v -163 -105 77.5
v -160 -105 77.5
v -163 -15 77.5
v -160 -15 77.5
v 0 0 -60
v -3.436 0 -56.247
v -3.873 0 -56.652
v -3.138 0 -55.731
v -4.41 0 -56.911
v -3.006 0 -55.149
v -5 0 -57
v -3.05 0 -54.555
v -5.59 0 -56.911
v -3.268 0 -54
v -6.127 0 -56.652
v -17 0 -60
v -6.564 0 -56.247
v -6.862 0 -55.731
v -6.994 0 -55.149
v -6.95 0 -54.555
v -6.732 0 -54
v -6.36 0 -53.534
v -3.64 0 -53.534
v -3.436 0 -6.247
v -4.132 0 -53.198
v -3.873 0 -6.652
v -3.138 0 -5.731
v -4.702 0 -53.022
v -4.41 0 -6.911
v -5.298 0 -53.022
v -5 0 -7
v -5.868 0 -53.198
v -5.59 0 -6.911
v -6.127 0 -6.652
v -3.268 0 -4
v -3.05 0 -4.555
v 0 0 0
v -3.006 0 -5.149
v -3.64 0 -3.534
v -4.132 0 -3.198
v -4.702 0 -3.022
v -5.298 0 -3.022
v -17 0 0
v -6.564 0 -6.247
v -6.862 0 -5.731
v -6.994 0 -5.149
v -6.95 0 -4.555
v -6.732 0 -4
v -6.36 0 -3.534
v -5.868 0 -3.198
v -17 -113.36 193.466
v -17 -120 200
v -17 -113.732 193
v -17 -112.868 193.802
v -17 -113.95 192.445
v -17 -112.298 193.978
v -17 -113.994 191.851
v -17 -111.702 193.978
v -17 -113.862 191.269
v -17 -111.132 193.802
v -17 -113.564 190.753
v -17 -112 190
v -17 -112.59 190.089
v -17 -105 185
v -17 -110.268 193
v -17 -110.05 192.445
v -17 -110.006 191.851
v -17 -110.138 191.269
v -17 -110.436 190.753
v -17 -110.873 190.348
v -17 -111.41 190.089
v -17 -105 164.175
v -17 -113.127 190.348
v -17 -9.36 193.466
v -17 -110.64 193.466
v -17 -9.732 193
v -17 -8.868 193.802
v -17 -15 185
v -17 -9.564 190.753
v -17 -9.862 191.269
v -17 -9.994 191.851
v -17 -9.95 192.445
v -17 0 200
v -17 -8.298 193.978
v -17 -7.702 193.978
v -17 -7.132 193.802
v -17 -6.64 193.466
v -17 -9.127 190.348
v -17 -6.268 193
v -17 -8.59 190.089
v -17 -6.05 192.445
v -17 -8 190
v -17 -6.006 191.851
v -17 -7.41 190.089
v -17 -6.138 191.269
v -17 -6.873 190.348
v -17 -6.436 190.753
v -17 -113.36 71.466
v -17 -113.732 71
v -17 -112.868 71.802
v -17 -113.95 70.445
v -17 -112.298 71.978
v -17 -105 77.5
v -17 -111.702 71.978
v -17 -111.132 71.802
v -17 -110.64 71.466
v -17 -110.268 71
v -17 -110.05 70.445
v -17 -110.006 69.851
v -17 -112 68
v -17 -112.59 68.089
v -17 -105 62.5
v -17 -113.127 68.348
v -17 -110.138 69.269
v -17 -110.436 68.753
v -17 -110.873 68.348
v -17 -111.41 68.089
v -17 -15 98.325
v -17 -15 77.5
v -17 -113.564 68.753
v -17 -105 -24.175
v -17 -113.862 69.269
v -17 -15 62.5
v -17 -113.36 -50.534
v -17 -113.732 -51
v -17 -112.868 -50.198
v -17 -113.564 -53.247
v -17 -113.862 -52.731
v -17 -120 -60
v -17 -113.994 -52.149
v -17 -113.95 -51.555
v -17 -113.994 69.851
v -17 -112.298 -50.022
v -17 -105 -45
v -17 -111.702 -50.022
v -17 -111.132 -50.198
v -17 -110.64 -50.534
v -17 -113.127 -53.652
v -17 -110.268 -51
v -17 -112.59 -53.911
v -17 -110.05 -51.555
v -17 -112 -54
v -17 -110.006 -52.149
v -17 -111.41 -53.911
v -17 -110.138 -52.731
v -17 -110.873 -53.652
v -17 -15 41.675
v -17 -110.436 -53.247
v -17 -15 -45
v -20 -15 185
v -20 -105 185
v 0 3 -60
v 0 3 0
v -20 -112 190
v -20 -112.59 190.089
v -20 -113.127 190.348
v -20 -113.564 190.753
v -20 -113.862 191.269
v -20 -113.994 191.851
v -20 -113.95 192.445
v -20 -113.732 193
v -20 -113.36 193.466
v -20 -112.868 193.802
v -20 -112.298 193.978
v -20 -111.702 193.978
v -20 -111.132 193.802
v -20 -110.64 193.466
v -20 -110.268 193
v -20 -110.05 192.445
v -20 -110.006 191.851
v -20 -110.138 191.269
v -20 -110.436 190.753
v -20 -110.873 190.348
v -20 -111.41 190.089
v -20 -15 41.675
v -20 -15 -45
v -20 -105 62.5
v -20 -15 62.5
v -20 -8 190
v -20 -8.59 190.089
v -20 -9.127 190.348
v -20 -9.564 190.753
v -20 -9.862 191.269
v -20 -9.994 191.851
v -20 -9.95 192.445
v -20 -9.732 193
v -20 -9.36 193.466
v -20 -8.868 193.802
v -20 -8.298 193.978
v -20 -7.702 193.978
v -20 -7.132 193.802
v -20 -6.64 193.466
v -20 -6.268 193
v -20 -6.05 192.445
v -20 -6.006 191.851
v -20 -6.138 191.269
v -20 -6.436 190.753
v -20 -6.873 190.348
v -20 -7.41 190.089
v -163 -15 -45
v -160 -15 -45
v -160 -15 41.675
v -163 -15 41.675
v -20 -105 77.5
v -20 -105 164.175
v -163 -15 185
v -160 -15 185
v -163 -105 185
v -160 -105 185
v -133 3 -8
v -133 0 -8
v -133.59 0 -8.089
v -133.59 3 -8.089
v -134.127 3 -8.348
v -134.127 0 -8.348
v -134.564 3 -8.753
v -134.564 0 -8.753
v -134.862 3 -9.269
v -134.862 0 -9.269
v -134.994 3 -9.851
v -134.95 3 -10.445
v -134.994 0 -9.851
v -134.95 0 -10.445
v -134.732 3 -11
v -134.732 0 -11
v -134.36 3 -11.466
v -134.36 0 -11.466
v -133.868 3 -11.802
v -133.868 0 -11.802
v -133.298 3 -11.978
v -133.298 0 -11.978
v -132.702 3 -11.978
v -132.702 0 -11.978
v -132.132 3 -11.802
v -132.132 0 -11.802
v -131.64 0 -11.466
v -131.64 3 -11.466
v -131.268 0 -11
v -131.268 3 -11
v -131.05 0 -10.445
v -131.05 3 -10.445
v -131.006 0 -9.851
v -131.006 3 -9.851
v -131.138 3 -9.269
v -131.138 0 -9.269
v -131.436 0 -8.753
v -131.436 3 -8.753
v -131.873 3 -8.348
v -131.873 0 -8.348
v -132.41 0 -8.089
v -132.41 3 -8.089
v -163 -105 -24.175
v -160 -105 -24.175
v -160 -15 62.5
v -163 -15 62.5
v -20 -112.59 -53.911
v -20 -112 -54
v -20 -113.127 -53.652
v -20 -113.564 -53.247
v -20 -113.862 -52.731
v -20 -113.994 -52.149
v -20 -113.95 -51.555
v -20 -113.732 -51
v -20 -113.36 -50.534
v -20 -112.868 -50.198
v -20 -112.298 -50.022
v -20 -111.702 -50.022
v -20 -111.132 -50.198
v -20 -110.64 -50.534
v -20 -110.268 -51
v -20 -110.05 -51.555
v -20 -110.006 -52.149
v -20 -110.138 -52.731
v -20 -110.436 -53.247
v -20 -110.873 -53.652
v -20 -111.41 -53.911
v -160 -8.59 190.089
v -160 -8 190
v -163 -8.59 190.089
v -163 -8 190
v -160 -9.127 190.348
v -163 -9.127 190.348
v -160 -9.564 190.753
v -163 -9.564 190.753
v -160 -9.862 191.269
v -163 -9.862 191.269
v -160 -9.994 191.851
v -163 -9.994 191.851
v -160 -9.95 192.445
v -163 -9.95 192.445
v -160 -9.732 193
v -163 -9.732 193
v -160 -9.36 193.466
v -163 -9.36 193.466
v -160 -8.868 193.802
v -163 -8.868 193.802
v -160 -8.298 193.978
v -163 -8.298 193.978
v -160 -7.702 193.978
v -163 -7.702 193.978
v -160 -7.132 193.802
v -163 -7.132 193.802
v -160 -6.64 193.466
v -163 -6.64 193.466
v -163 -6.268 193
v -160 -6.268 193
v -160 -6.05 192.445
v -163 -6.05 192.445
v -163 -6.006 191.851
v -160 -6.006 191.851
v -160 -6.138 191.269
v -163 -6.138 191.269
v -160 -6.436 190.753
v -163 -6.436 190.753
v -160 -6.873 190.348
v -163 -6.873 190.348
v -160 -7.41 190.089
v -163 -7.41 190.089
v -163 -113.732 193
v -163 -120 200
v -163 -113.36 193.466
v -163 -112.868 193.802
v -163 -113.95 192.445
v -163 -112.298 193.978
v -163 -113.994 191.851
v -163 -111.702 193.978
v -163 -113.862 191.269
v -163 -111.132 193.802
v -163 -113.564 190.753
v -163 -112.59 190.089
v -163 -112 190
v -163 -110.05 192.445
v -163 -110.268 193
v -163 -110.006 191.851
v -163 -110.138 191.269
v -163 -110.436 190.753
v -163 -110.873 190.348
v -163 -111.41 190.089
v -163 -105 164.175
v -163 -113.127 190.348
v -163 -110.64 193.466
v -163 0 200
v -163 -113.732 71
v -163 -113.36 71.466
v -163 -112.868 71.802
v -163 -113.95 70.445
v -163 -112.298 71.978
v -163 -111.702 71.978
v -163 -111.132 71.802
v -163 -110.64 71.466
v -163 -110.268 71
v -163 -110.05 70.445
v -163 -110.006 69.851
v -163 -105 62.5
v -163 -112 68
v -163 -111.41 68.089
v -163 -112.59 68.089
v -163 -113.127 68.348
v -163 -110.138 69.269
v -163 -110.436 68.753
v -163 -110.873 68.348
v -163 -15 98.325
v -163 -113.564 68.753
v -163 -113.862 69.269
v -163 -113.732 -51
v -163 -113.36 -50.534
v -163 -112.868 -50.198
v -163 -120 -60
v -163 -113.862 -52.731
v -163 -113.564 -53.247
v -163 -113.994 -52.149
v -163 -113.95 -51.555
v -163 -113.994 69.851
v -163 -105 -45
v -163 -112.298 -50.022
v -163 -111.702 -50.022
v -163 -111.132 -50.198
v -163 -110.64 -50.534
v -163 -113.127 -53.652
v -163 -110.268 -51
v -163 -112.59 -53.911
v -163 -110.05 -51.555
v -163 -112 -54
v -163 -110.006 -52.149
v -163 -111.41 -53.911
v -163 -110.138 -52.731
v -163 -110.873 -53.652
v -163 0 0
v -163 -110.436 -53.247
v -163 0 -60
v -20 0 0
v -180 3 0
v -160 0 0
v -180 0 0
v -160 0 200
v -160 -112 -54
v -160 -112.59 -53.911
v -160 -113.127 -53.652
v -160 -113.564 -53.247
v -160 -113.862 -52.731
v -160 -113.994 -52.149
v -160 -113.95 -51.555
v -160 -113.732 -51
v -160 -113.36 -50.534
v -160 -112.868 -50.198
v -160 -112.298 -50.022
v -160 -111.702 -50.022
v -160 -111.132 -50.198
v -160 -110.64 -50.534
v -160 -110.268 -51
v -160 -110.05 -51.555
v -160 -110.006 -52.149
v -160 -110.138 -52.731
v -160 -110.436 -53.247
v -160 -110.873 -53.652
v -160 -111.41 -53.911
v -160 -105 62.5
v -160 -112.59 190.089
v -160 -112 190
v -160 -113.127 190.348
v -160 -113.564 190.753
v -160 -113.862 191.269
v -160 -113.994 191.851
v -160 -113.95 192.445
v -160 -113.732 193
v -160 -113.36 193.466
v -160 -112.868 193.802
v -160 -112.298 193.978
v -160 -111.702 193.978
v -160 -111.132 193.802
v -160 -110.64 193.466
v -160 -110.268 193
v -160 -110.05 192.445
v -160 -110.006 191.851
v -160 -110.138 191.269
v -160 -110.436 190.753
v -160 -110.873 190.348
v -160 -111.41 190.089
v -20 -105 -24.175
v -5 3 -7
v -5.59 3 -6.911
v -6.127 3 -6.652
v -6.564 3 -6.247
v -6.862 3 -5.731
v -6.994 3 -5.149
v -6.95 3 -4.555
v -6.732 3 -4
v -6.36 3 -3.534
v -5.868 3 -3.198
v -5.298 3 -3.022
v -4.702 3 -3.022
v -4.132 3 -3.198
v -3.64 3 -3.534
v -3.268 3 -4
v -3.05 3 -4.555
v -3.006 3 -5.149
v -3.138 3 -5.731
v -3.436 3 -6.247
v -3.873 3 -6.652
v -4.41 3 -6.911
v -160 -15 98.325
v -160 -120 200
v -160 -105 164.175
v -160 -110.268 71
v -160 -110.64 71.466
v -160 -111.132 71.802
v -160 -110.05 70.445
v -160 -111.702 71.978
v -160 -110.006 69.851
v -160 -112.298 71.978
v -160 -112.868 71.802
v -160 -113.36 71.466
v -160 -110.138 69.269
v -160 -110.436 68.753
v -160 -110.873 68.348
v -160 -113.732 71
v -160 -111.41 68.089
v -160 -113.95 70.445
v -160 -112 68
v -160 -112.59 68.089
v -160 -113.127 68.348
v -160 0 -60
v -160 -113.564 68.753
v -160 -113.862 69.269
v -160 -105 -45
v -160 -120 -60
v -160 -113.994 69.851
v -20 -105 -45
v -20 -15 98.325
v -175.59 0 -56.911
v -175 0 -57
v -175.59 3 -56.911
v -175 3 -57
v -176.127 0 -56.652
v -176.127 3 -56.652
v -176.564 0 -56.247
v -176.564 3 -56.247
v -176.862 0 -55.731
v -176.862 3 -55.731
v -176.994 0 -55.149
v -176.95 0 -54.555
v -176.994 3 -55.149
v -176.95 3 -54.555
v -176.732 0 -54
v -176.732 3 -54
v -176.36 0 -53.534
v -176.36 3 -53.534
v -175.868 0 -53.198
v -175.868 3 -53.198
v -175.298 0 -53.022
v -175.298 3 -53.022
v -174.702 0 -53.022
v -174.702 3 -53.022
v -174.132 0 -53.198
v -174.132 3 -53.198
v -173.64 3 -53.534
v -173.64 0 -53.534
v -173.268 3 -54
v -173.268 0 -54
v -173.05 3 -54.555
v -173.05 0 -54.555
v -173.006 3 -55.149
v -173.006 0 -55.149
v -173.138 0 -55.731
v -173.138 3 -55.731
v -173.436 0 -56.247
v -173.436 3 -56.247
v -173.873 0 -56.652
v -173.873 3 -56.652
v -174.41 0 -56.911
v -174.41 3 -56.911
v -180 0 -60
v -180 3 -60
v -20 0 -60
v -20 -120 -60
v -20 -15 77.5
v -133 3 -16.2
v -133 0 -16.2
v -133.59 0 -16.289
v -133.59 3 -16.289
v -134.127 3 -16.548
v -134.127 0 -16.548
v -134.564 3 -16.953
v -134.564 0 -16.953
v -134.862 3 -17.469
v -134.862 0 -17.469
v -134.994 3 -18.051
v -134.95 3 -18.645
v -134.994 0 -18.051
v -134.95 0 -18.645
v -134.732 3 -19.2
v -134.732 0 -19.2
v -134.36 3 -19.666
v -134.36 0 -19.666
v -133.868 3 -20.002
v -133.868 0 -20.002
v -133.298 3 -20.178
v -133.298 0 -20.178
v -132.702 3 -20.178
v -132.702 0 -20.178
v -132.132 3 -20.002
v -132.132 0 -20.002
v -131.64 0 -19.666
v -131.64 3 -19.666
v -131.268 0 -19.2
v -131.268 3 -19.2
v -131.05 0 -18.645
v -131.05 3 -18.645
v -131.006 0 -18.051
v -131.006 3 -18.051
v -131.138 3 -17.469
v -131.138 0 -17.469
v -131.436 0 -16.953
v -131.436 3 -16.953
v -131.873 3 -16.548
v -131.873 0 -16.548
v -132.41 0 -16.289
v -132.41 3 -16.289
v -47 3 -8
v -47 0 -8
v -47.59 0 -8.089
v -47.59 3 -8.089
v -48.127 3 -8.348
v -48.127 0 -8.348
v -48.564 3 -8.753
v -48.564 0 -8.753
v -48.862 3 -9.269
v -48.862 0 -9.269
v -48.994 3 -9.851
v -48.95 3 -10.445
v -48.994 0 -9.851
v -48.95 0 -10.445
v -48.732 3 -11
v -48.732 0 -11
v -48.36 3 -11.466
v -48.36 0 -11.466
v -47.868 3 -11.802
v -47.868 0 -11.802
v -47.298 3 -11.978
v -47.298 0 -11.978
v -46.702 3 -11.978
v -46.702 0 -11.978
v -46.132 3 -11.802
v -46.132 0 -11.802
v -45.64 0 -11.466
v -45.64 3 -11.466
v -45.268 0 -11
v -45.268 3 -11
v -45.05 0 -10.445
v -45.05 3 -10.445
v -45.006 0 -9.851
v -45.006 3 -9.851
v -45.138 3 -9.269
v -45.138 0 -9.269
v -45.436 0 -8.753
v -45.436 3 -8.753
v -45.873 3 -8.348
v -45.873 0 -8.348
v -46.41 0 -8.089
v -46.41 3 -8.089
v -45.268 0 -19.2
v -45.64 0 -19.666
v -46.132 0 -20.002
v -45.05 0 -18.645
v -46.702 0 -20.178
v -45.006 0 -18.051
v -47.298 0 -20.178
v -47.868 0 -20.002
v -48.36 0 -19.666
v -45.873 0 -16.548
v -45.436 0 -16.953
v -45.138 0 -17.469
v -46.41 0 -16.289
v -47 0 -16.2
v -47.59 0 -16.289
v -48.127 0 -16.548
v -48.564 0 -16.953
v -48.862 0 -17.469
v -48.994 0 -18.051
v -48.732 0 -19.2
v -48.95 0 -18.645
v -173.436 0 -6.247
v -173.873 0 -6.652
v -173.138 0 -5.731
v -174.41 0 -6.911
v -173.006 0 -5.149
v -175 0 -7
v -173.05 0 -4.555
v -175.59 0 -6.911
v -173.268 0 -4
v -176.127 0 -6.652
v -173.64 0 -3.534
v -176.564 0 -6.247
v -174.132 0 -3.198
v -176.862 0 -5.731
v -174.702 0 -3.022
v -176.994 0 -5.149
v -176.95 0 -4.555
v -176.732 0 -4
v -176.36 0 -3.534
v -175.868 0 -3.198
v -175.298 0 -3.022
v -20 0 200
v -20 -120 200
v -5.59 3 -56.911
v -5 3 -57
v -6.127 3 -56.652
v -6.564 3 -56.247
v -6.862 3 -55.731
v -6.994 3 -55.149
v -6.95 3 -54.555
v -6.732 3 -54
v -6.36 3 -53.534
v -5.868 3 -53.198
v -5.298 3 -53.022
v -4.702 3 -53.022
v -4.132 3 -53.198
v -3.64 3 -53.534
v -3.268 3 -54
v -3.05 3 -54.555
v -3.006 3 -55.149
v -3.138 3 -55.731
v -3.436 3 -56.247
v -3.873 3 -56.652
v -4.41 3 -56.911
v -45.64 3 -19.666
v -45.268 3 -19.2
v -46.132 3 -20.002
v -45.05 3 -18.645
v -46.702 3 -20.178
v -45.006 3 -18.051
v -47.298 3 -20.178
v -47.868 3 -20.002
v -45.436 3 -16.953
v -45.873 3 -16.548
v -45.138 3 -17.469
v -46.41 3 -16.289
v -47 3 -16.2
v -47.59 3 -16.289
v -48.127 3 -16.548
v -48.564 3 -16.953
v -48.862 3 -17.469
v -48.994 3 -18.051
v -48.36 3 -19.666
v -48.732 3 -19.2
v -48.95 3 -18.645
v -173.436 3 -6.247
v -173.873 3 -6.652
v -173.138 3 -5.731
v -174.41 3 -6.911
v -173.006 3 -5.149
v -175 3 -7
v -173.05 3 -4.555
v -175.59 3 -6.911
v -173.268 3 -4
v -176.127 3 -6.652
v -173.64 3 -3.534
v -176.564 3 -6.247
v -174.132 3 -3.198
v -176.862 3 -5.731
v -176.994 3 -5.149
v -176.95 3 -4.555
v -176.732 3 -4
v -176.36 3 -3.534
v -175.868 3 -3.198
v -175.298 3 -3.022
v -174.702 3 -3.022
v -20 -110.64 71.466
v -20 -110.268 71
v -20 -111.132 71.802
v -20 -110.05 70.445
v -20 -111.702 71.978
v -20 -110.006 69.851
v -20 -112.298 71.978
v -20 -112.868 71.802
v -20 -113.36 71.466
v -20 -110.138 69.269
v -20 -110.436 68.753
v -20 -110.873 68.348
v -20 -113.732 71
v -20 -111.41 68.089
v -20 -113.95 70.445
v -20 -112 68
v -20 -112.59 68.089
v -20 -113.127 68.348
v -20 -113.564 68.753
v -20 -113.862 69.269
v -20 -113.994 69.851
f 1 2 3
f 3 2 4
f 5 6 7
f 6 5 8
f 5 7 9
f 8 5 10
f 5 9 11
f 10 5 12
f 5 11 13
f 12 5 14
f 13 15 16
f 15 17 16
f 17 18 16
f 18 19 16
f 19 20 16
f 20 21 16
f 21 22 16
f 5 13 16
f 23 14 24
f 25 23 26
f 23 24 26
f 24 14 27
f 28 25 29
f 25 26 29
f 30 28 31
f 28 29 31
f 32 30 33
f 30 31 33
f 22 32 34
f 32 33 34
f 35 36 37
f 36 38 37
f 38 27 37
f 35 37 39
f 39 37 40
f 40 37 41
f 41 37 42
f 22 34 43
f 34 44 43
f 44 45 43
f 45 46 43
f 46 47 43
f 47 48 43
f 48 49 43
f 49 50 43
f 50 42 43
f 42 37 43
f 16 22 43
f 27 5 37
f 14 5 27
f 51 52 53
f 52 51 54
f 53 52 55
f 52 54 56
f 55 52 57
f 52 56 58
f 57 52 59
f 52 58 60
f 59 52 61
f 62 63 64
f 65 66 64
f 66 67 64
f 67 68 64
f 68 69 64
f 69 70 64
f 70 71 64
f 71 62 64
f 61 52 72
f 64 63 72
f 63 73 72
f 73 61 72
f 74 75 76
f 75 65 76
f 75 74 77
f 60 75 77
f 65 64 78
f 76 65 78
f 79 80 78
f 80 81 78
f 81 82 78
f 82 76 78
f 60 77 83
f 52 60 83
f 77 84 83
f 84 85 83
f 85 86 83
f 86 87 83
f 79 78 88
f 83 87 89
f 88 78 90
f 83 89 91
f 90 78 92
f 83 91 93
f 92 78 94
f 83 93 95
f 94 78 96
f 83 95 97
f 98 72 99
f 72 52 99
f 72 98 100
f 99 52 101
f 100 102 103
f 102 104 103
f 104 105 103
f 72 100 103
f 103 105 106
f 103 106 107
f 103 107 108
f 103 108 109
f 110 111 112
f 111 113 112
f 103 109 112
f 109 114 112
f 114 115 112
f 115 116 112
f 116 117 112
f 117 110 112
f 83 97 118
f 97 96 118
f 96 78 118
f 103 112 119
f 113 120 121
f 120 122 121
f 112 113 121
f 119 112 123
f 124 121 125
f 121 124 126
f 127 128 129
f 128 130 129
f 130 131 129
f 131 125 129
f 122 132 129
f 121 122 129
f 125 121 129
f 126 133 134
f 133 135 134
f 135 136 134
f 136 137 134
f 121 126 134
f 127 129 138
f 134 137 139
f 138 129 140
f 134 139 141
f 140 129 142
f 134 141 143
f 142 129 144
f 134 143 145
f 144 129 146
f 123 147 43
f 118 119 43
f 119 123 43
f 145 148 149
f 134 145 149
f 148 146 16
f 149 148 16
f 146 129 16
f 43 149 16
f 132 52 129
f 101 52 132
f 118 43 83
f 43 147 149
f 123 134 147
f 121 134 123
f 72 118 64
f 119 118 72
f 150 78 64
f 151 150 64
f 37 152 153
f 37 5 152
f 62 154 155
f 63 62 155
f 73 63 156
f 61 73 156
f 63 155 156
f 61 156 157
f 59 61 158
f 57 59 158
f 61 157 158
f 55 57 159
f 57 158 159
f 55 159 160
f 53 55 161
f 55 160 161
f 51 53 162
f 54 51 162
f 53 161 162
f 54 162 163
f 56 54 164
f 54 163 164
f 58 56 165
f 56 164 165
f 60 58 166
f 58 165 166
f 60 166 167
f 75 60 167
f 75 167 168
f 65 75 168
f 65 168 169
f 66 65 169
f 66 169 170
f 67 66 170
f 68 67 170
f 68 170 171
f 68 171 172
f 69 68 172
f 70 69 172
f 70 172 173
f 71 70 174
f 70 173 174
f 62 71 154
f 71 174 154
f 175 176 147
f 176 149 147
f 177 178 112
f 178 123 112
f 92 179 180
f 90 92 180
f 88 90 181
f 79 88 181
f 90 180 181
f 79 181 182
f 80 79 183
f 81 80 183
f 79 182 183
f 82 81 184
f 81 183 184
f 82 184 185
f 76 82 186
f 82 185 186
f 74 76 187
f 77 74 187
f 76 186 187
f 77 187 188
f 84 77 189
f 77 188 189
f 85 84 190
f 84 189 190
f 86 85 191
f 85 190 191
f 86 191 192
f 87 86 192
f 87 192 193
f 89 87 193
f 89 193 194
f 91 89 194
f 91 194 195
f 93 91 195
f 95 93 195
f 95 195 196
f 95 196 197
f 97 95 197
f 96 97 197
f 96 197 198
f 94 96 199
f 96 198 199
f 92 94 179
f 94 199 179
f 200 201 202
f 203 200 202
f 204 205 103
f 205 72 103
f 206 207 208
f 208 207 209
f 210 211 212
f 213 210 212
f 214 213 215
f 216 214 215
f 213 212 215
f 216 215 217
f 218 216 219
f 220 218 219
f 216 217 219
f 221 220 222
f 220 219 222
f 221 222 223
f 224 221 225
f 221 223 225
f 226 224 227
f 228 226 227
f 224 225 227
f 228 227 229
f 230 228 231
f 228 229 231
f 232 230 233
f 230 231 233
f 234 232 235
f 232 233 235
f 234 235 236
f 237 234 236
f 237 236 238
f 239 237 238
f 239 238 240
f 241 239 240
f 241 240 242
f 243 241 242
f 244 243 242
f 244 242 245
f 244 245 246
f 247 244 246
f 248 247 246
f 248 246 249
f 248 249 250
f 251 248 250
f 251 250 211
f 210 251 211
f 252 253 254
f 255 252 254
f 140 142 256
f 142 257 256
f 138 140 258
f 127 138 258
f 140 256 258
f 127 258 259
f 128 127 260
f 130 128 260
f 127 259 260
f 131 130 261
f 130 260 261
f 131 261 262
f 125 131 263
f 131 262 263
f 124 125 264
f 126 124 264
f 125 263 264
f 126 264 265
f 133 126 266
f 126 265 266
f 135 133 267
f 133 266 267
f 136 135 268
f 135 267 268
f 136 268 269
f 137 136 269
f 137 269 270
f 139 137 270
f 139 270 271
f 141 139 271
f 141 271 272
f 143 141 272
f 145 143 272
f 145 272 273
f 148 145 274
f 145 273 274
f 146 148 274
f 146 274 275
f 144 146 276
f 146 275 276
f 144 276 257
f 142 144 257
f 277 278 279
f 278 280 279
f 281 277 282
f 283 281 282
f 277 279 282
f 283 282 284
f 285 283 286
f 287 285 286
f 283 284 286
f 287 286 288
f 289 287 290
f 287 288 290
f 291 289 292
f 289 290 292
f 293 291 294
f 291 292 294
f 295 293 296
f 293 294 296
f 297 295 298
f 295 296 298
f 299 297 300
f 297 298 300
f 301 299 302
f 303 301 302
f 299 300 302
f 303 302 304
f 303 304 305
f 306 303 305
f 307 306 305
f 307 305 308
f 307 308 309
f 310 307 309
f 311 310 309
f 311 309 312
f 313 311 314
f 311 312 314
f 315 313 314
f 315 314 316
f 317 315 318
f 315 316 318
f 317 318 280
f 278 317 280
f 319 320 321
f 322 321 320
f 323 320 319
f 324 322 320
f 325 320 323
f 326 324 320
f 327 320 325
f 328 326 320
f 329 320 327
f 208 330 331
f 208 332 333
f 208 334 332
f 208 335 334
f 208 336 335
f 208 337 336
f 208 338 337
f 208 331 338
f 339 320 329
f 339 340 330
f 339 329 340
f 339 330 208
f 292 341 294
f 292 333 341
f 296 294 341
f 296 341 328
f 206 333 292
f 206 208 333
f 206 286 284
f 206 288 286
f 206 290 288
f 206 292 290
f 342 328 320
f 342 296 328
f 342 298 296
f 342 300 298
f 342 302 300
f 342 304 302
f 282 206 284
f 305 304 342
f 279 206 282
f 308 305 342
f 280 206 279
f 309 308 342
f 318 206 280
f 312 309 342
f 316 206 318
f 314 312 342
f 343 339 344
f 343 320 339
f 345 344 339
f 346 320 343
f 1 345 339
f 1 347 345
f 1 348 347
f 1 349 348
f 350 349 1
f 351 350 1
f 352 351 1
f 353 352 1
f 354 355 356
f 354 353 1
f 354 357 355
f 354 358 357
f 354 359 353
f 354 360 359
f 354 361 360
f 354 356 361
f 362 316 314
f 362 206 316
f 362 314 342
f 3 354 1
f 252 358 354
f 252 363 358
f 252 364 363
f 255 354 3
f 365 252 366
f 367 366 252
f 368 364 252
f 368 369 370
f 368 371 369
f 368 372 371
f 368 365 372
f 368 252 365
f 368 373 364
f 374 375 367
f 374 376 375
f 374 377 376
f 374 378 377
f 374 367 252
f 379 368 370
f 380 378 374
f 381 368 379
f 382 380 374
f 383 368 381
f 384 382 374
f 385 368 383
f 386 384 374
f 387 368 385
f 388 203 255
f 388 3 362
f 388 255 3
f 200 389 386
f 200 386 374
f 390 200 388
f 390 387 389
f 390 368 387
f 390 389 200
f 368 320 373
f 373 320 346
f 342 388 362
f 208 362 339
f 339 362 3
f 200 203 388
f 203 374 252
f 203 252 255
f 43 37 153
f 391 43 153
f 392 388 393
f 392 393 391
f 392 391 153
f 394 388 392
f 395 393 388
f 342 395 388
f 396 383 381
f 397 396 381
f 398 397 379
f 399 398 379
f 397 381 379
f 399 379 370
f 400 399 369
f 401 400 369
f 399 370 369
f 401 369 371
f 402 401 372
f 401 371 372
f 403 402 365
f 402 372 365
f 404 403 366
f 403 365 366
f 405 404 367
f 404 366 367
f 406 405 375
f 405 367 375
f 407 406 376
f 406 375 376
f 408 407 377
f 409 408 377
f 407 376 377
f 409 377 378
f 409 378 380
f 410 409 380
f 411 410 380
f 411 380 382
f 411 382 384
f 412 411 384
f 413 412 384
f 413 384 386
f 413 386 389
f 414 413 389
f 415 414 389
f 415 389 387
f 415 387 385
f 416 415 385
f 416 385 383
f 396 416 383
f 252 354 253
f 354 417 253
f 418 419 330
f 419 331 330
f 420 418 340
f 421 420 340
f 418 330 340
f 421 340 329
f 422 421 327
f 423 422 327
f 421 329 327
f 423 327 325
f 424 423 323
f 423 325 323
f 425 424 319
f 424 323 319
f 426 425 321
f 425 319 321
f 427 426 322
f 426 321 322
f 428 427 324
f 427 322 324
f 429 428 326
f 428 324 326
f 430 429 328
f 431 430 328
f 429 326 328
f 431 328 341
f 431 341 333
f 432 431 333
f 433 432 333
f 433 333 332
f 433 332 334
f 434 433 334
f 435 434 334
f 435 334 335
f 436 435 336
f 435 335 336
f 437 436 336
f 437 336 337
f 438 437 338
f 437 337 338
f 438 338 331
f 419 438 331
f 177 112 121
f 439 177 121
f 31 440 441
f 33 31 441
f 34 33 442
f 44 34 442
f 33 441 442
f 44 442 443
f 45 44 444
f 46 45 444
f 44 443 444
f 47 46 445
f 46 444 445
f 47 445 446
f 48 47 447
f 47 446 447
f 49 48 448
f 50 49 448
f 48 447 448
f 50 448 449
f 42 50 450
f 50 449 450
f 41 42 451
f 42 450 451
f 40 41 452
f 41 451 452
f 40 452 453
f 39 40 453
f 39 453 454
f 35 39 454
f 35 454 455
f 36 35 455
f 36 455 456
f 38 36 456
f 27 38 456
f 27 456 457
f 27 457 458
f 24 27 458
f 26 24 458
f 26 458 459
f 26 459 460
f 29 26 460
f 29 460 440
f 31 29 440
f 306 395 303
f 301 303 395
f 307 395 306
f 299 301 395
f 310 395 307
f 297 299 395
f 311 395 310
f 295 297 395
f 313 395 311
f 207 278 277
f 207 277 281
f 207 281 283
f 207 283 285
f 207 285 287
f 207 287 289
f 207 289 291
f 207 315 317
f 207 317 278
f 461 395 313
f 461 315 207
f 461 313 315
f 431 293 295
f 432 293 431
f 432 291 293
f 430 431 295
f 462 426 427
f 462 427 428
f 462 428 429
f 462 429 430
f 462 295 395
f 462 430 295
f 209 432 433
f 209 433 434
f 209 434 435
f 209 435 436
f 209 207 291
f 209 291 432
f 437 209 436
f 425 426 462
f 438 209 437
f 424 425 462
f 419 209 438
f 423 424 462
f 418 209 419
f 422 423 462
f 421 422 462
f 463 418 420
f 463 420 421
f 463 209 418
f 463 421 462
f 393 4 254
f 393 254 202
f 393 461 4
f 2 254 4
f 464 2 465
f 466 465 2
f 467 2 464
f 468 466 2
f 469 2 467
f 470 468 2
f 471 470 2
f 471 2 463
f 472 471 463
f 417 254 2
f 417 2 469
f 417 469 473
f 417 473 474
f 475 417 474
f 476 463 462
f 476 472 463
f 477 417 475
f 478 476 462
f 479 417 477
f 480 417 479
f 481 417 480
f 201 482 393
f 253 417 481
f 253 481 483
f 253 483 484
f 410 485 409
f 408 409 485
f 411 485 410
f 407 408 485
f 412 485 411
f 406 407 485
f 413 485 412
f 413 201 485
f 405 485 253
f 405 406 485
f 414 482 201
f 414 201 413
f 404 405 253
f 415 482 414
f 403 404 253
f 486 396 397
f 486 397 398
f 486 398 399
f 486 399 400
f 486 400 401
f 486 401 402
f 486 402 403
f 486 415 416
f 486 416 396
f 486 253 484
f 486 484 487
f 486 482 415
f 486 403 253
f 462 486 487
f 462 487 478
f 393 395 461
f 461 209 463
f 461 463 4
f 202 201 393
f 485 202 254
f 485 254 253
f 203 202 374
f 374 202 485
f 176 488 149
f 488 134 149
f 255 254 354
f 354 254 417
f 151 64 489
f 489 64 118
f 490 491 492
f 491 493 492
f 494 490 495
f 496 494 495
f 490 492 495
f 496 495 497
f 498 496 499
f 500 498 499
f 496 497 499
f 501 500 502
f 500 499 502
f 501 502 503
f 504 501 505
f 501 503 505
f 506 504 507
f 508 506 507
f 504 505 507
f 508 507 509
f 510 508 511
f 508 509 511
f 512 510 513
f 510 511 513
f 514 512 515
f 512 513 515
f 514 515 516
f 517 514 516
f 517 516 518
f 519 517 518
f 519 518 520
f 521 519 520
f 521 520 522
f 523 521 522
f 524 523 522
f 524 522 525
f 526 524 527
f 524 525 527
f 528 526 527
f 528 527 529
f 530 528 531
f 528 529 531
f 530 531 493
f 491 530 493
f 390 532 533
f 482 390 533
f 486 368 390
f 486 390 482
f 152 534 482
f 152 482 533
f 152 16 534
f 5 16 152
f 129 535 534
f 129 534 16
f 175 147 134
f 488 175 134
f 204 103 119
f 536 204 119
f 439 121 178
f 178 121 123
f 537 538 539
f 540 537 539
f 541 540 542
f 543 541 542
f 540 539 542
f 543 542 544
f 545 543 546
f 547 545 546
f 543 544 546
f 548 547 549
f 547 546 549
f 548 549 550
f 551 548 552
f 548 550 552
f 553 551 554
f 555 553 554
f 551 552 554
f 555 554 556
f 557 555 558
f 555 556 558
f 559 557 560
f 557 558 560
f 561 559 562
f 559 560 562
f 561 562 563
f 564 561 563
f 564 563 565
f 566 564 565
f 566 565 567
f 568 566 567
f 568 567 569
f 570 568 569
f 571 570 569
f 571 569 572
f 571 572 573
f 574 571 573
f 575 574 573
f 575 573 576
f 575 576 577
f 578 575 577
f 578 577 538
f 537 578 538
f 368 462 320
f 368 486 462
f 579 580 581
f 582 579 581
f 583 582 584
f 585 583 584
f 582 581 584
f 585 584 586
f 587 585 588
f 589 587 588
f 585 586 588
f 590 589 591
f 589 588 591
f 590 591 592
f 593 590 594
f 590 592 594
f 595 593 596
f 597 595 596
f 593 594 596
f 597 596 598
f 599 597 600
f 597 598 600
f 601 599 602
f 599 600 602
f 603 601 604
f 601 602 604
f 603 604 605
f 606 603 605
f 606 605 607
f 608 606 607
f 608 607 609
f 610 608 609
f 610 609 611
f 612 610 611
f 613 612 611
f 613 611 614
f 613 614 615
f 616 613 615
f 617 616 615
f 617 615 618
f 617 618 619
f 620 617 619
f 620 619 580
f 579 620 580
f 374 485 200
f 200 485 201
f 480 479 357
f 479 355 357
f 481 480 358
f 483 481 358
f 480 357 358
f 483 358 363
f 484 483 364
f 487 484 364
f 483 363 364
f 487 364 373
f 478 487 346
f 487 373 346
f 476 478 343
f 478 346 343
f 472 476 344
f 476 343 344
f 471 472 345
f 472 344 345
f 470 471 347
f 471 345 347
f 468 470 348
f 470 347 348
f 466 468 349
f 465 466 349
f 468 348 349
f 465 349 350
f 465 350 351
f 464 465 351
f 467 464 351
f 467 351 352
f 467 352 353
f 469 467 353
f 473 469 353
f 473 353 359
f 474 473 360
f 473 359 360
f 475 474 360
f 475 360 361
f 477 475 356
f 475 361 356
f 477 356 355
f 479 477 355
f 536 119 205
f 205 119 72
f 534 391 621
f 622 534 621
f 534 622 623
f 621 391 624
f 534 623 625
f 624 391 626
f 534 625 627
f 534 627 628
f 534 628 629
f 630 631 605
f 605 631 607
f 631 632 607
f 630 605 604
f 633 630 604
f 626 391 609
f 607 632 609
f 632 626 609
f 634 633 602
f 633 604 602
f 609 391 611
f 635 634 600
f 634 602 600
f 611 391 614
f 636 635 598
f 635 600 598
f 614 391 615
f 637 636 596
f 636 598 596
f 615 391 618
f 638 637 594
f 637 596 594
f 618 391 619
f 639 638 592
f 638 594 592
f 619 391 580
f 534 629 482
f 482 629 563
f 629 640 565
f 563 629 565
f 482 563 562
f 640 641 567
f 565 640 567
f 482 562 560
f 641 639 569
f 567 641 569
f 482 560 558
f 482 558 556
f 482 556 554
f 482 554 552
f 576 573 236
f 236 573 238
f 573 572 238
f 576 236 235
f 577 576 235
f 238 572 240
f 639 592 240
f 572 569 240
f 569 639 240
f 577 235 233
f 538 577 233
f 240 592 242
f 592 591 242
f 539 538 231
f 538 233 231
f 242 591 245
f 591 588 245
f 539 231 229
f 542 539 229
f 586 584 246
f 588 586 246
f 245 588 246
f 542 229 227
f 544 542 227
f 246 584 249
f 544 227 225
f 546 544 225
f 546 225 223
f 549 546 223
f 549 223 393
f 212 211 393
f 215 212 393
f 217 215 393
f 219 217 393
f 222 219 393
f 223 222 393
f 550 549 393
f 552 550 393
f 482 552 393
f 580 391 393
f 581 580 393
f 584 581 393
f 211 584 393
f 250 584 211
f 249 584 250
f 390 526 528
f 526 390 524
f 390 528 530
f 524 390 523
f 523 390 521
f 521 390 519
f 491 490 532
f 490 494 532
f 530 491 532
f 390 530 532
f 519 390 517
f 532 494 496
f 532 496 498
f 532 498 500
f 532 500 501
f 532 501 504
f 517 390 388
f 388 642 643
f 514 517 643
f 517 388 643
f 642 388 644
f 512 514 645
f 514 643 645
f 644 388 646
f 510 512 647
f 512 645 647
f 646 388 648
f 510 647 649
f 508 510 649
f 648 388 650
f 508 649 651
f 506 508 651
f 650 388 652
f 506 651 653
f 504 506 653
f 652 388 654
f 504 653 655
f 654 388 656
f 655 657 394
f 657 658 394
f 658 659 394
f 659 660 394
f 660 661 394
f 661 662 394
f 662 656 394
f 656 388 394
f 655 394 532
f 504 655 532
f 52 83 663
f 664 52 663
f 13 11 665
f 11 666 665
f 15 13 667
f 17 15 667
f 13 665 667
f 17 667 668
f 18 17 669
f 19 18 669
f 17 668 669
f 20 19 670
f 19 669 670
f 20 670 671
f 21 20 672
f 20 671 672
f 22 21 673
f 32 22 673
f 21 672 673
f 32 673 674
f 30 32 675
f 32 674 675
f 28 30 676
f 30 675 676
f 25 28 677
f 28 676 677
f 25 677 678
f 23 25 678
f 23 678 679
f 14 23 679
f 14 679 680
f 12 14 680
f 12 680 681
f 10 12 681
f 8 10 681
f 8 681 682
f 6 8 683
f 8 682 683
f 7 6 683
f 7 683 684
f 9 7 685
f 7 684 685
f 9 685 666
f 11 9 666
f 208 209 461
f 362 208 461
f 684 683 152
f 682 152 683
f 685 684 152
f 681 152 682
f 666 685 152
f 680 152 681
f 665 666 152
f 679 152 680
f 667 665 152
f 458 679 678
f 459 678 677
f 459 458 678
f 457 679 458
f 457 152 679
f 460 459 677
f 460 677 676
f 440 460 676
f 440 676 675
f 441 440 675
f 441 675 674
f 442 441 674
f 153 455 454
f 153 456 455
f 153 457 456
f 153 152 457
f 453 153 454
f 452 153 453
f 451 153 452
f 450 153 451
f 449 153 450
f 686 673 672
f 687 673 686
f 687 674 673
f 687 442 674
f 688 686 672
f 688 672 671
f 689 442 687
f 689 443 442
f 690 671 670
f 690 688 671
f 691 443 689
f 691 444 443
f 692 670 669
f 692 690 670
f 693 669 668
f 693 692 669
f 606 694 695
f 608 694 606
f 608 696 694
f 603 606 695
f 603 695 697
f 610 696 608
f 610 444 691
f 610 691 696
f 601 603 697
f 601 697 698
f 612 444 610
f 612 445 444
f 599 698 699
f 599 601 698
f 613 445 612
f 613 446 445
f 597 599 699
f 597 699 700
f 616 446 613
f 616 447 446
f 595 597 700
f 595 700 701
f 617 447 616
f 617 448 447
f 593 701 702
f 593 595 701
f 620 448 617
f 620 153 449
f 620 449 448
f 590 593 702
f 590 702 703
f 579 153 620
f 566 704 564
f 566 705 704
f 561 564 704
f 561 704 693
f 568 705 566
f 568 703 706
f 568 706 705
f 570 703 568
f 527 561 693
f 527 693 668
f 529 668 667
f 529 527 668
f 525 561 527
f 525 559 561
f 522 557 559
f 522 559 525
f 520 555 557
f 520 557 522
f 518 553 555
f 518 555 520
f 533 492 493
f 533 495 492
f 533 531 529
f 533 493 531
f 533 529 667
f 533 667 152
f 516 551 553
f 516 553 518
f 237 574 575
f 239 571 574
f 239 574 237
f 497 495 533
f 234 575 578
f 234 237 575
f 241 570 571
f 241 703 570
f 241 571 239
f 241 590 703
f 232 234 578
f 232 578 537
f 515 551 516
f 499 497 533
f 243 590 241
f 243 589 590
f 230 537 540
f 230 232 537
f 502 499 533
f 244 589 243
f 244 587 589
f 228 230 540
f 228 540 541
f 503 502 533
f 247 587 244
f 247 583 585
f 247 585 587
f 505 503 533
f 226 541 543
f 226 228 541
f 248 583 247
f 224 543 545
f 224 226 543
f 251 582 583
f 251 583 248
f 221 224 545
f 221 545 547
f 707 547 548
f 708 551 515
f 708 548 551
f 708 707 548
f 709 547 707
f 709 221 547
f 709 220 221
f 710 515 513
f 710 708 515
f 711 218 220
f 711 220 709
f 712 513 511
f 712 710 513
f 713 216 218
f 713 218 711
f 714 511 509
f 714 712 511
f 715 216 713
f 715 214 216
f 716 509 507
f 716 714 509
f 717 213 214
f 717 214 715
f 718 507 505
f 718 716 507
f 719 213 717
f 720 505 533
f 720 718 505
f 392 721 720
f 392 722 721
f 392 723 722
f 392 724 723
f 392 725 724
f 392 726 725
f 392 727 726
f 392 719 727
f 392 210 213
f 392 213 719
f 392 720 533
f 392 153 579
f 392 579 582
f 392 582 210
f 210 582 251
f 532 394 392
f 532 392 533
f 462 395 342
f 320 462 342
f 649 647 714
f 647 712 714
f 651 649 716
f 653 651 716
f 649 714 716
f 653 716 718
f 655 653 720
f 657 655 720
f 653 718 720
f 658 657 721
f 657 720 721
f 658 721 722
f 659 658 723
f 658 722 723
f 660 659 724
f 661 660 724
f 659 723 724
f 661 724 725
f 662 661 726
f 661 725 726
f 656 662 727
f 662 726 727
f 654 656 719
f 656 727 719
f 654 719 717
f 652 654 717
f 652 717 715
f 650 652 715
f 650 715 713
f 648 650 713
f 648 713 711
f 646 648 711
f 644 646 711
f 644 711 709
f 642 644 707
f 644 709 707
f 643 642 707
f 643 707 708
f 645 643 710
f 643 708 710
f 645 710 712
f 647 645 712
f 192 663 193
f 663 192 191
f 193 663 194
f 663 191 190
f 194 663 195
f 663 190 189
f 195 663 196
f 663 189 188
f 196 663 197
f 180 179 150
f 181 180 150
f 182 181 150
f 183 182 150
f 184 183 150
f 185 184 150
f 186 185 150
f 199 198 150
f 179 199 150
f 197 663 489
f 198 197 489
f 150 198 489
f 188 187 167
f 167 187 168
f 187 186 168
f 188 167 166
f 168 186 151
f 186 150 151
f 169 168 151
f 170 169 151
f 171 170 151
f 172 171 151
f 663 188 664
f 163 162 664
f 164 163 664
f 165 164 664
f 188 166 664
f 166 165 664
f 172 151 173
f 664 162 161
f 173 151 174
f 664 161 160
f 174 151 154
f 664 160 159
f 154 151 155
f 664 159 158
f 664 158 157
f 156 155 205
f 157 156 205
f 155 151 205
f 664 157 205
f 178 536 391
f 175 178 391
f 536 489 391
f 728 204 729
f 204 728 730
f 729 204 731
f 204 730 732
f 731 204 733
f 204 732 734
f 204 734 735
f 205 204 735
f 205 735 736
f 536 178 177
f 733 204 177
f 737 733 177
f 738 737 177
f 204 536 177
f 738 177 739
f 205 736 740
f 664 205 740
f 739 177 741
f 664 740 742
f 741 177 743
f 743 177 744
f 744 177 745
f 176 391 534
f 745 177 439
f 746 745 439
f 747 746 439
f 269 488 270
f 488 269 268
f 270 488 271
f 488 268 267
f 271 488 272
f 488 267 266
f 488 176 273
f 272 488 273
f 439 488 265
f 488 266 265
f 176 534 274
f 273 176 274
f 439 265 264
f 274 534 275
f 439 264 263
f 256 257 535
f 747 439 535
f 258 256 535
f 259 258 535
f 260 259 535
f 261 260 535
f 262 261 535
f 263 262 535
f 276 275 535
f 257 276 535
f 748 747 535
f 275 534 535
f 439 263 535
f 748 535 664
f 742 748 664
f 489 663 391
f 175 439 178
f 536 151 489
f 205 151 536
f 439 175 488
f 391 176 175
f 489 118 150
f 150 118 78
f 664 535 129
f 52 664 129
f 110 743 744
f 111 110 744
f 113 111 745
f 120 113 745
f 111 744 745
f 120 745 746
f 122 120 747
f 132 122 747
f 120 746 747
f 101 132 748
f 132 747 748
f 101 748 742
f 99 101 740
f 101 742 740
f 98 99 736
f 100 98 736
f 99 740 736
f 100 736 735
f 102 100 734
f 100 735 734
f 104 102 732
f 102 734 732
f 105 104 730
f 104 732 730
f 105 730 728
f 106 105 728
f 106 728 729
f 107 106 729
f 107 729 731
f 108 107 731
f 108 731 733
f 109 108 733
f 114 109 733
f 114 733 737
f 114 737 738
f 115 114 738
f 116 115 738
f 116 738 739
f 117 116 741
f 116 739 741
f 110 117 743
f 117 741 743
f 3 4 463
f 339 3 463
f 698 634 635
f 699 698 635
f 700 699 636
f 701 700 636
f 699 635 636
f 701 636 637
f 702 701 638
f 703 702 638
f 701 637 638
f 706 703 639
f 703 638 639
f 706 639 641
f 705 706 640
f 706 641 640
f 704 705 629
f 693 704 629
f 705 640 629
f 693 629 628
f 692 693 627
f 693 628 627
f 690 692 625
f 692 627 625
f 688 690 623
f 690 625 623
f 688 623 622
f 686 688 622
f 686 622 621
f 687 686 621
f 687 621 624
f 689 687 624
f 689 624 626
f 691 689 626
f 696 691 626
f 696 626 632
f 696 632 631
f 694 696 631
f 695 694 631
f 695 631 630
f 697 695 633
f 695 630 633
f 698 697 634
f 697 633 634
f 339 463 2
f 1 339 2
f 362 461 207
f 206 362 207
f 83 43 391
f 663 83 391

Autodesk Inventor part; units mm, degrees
ref_plane "YZ Plane" through (0, 0, 0) normal (1, 0, 0) x (0, 1, 0)
ref_plane "XZ Plane" through (0, 0, 0) normal (0, 1, 0) x (-1, 0, 0)
ref_plane "XY Plane" through (0, 0, 0) normal (0, 0, 1) x (1, 0, 0)
sketch "Sketch1" plane through (0, 0, 0) normal (0, 1, 0) x (-1, 0, 0)
  line L0 (0, 0) -> (180, 0)
  line L1 (180, 0) -> (180, -60)
  line L2 (180, -60) -> (0, -60)
  line L3 (0, -60) -> (0, 0)
  dimension "d0" = 180
  dimension "d34" = 60
extrude "Plate1" add sketch "Sketch1" along normal blind 3
sketch "Sketch2" plane through (0, 3, 0) normal (0, 1, 0) x (1, 0, 0)
  line L0 (0, 60) -> (0, 0) projected
  line L1 (-180, 0) -> (-180, 60) projected
  line L2 (-133, 18.2) -> (-47, 18.2) construction
  line L3 (-180, 60) -> (0, 60) construction
  circle A0 centre (-103, 147.6372) radius 2 projected
  circle A1 centre (-47, 147.6372) radius 2 projected
  line L4 (-40, 142.6372) -> (-110, 142.6372) projected
  line L5 (-110, 142.6372) -> (-110, 152.6372) projected
  line L6 (-110, 152.6372) -> (-40, 152.6372) projected
  line L7 (-40, 152.6372) -> (-40, 142.6372) projected
  circle A2 centre (-103, 162.6372) radius 2 projected
  circle A3 centre (-47, 162.6372) radius 2 projected
  line L8 (-40, 157.6372) -> (-110, 157.6372) projected
  line L9 (-110, 157.6372) -> (-110, 167.6372) projected
  line L10 (-110, 167.6372) -> (-40, 167.6372) projected
  line L11 (-40, 167.6372) -> (-40, 157.6372) projected
  circle A4 centre (-103, 177.6372) radius 2 projected
  circle A5 centre (-47, 177.6372) radius 2 projected
  line L12 (-110, 182.6372) -> (-40, 182.6372) projected
  line L13 (-40, 182.6372) -> (-40, 172.6372) projected
  line L14 (-40, 172.6372) -> (-110, 172.6372) projected
  line L15 (-110, 172.6372) -> (-110, 182.6372) projected
  circle A6 centre (-103, 192.6372) radius 2 projected
  circle A7 centre (-47, 192.6372) radius 2 projected
  line L16 (-40, 187.6372) -> (-110, 187.6372) projected
  line L17 (-110, 187.6372) -> (-110, 197.6372) projected
  line L18 (-110, 197.6372) -> (-40, 197.6372) projected
  line L19 (-40, 197.6372) -> (-40, 187.6372) projected
  point P0 (-47, 10)
  point P1 (-133, 10)
  point P2 (-90, 18.2)
  point P3 (-90, 60)
  dimension "d4" = 8.2
  dimension "d31" = 86
  dimension "d56" = 10
hole "Hole1" at (-47, 3, -18.2) at (-47, 3, -10) at (-133, 3, -18.2) at (-133, 3, -10) direction (0, -1, 0) diameter 4 end through all
ref_plane "Work Plane1" through (-90, 0, 0) normal (1, 0, 0) x (0, 0, -1)
sketch "Sketch8" plane through (0, 0, 0) normal (0, -1, 0) x (1, 0, 0)
  line L0 (-180, 0) -> (-180, -60) projected
  line L1 (0, 0) -> (-180, 0) projected
  line L2 (-180, -60) -> (0, -60) projected
  line L3 (0, -60) -> (0, 0) projected
  line L4 (-175, -55) -> (-175, -5) construction
  line L5 (-175, -5) -> (-5, -5) construction
  line L6 (-5, -5) -> (-5, -55) construction
  line L7 (-5, -55) -> (-175, -55) construction
  dimension "d57" = 5
hole "Hole3" at (-175, 0, -5) at (-175, 0, -55) at (-5, 0, -55) at (-5, 0, -5) direction (0, 1, 0) diameter 4 end through all
sketch "Sketch9" plane through (0, 0, -60) normal (0, 0, -1) x (-1, 0, 0)
  line L0 (0, 0) -> (180, 0) projected
  line L1 (163, 0) -> (160, 0)
  line L2 (160, 0) -> (160, -120)
  line L3 (160, -120) -> (163, -120)
  line L4 (163, -120) -> (163, 0)
  line L5 (17, 0) -> (20, 0)
  line L6 (20, 0) -> (20, -120)
  line L7 (20, -120) -> (17, -120)
  line L8 (17, -120) -> (17, 0)
  line L9 (160, -120) -> (20, -120) construction
  point P0 (90, -120)
  point P1 (90, 0)
  dimension "d65" = 3
  dimension "d66" = 140
  dimension "d67" = 120
extrude "Extrusion3" add sketch "Sketch9" against normal blind 260
sketch "Sketch10" plane through (-17, -120, -60) normal (1, 0, 0) x (0, 0, -1)
  line L0 (-15, 15) -> (-15, 105)
  line L1 (-15, 105) -> (-101.675, 105)
  line L2 (-101.675, 105) -> (-15, 15)
  line L3 (-35.825, 15) -> (-122.5, 105)
  line L4 (-122.5, 105) -> (-122.5, 15)
  line L5 (-122.5, 15) -> (-35.825, 15)
  line L6 (-137.5, 15) -> (-137.5, 105)
  line L7 (-137.5, 105) -> (-224.175, 15)
  line L8 (-224.175, 15) -> (-137.5, 15)
  line L9 (-245, 15) -> (-158.325, 105)
  line L10 (-158.325, 105) -> (-245, 105)
  line L11 (-245, 105) -> (-245, 15)
  line L12 (-260, 0) -> (-260, 120) projected
  line L13 (-60, 120) -> (-260, 120) projected
  line L14 (0, 120) -> (0, 0) projected
  line L15 (0, 0) -> (-260, 0) projected
  point P0 (-8, 8)
  point P1 (-252, 8)
  point P2 (-252, 112)
  point P3 (-130, 8)
  point P4 (-130, 0)
  dimension "d70" = 15
  dimension "d71" = 15
  dimension "d72" = 15
  dimension "d73" = 15
  dimension "d74" = 15
  dimension "d75" = 15
  dimension "d77" = 15
  dimension "d80" = 8
  dimension "d81" = 8
  dimension "d82" = 8
  dimension "d83" = 8
extrude "Extrusion4" cut sketch "Sketch10" against normal through all
hole "Hole4" at (-17, -112, -52) at (-17, -112, 192) at (-17, -8, 192) at (-17, -112, 70) direction (-1, 0, 0) diameter 4 end through all
equation "\"d10\" = Thickness"
equation "\"d63\" = Thickness"
equation "\"BendRadius\" = Thickness"
equation "\"BendReliefWidth\" = Thickness"
equation "\"BendReliefDepth\" = 0.5 * Thickness"
equation "\"CornerReliefSize\" = 4 * Thickness"
equation "\"MinimumRemnant\" = 2 * Thickness"
equation "\"TransitionRadius\" = BendRadius"
equation "\"JacobiRadiusSize\" = BendRadius"
equation "\"GapSize\" = Thickness"
equation "\"d2\" = BendRadius"
equation "\"Thickness\" = 3"
properties part number "BASE"
